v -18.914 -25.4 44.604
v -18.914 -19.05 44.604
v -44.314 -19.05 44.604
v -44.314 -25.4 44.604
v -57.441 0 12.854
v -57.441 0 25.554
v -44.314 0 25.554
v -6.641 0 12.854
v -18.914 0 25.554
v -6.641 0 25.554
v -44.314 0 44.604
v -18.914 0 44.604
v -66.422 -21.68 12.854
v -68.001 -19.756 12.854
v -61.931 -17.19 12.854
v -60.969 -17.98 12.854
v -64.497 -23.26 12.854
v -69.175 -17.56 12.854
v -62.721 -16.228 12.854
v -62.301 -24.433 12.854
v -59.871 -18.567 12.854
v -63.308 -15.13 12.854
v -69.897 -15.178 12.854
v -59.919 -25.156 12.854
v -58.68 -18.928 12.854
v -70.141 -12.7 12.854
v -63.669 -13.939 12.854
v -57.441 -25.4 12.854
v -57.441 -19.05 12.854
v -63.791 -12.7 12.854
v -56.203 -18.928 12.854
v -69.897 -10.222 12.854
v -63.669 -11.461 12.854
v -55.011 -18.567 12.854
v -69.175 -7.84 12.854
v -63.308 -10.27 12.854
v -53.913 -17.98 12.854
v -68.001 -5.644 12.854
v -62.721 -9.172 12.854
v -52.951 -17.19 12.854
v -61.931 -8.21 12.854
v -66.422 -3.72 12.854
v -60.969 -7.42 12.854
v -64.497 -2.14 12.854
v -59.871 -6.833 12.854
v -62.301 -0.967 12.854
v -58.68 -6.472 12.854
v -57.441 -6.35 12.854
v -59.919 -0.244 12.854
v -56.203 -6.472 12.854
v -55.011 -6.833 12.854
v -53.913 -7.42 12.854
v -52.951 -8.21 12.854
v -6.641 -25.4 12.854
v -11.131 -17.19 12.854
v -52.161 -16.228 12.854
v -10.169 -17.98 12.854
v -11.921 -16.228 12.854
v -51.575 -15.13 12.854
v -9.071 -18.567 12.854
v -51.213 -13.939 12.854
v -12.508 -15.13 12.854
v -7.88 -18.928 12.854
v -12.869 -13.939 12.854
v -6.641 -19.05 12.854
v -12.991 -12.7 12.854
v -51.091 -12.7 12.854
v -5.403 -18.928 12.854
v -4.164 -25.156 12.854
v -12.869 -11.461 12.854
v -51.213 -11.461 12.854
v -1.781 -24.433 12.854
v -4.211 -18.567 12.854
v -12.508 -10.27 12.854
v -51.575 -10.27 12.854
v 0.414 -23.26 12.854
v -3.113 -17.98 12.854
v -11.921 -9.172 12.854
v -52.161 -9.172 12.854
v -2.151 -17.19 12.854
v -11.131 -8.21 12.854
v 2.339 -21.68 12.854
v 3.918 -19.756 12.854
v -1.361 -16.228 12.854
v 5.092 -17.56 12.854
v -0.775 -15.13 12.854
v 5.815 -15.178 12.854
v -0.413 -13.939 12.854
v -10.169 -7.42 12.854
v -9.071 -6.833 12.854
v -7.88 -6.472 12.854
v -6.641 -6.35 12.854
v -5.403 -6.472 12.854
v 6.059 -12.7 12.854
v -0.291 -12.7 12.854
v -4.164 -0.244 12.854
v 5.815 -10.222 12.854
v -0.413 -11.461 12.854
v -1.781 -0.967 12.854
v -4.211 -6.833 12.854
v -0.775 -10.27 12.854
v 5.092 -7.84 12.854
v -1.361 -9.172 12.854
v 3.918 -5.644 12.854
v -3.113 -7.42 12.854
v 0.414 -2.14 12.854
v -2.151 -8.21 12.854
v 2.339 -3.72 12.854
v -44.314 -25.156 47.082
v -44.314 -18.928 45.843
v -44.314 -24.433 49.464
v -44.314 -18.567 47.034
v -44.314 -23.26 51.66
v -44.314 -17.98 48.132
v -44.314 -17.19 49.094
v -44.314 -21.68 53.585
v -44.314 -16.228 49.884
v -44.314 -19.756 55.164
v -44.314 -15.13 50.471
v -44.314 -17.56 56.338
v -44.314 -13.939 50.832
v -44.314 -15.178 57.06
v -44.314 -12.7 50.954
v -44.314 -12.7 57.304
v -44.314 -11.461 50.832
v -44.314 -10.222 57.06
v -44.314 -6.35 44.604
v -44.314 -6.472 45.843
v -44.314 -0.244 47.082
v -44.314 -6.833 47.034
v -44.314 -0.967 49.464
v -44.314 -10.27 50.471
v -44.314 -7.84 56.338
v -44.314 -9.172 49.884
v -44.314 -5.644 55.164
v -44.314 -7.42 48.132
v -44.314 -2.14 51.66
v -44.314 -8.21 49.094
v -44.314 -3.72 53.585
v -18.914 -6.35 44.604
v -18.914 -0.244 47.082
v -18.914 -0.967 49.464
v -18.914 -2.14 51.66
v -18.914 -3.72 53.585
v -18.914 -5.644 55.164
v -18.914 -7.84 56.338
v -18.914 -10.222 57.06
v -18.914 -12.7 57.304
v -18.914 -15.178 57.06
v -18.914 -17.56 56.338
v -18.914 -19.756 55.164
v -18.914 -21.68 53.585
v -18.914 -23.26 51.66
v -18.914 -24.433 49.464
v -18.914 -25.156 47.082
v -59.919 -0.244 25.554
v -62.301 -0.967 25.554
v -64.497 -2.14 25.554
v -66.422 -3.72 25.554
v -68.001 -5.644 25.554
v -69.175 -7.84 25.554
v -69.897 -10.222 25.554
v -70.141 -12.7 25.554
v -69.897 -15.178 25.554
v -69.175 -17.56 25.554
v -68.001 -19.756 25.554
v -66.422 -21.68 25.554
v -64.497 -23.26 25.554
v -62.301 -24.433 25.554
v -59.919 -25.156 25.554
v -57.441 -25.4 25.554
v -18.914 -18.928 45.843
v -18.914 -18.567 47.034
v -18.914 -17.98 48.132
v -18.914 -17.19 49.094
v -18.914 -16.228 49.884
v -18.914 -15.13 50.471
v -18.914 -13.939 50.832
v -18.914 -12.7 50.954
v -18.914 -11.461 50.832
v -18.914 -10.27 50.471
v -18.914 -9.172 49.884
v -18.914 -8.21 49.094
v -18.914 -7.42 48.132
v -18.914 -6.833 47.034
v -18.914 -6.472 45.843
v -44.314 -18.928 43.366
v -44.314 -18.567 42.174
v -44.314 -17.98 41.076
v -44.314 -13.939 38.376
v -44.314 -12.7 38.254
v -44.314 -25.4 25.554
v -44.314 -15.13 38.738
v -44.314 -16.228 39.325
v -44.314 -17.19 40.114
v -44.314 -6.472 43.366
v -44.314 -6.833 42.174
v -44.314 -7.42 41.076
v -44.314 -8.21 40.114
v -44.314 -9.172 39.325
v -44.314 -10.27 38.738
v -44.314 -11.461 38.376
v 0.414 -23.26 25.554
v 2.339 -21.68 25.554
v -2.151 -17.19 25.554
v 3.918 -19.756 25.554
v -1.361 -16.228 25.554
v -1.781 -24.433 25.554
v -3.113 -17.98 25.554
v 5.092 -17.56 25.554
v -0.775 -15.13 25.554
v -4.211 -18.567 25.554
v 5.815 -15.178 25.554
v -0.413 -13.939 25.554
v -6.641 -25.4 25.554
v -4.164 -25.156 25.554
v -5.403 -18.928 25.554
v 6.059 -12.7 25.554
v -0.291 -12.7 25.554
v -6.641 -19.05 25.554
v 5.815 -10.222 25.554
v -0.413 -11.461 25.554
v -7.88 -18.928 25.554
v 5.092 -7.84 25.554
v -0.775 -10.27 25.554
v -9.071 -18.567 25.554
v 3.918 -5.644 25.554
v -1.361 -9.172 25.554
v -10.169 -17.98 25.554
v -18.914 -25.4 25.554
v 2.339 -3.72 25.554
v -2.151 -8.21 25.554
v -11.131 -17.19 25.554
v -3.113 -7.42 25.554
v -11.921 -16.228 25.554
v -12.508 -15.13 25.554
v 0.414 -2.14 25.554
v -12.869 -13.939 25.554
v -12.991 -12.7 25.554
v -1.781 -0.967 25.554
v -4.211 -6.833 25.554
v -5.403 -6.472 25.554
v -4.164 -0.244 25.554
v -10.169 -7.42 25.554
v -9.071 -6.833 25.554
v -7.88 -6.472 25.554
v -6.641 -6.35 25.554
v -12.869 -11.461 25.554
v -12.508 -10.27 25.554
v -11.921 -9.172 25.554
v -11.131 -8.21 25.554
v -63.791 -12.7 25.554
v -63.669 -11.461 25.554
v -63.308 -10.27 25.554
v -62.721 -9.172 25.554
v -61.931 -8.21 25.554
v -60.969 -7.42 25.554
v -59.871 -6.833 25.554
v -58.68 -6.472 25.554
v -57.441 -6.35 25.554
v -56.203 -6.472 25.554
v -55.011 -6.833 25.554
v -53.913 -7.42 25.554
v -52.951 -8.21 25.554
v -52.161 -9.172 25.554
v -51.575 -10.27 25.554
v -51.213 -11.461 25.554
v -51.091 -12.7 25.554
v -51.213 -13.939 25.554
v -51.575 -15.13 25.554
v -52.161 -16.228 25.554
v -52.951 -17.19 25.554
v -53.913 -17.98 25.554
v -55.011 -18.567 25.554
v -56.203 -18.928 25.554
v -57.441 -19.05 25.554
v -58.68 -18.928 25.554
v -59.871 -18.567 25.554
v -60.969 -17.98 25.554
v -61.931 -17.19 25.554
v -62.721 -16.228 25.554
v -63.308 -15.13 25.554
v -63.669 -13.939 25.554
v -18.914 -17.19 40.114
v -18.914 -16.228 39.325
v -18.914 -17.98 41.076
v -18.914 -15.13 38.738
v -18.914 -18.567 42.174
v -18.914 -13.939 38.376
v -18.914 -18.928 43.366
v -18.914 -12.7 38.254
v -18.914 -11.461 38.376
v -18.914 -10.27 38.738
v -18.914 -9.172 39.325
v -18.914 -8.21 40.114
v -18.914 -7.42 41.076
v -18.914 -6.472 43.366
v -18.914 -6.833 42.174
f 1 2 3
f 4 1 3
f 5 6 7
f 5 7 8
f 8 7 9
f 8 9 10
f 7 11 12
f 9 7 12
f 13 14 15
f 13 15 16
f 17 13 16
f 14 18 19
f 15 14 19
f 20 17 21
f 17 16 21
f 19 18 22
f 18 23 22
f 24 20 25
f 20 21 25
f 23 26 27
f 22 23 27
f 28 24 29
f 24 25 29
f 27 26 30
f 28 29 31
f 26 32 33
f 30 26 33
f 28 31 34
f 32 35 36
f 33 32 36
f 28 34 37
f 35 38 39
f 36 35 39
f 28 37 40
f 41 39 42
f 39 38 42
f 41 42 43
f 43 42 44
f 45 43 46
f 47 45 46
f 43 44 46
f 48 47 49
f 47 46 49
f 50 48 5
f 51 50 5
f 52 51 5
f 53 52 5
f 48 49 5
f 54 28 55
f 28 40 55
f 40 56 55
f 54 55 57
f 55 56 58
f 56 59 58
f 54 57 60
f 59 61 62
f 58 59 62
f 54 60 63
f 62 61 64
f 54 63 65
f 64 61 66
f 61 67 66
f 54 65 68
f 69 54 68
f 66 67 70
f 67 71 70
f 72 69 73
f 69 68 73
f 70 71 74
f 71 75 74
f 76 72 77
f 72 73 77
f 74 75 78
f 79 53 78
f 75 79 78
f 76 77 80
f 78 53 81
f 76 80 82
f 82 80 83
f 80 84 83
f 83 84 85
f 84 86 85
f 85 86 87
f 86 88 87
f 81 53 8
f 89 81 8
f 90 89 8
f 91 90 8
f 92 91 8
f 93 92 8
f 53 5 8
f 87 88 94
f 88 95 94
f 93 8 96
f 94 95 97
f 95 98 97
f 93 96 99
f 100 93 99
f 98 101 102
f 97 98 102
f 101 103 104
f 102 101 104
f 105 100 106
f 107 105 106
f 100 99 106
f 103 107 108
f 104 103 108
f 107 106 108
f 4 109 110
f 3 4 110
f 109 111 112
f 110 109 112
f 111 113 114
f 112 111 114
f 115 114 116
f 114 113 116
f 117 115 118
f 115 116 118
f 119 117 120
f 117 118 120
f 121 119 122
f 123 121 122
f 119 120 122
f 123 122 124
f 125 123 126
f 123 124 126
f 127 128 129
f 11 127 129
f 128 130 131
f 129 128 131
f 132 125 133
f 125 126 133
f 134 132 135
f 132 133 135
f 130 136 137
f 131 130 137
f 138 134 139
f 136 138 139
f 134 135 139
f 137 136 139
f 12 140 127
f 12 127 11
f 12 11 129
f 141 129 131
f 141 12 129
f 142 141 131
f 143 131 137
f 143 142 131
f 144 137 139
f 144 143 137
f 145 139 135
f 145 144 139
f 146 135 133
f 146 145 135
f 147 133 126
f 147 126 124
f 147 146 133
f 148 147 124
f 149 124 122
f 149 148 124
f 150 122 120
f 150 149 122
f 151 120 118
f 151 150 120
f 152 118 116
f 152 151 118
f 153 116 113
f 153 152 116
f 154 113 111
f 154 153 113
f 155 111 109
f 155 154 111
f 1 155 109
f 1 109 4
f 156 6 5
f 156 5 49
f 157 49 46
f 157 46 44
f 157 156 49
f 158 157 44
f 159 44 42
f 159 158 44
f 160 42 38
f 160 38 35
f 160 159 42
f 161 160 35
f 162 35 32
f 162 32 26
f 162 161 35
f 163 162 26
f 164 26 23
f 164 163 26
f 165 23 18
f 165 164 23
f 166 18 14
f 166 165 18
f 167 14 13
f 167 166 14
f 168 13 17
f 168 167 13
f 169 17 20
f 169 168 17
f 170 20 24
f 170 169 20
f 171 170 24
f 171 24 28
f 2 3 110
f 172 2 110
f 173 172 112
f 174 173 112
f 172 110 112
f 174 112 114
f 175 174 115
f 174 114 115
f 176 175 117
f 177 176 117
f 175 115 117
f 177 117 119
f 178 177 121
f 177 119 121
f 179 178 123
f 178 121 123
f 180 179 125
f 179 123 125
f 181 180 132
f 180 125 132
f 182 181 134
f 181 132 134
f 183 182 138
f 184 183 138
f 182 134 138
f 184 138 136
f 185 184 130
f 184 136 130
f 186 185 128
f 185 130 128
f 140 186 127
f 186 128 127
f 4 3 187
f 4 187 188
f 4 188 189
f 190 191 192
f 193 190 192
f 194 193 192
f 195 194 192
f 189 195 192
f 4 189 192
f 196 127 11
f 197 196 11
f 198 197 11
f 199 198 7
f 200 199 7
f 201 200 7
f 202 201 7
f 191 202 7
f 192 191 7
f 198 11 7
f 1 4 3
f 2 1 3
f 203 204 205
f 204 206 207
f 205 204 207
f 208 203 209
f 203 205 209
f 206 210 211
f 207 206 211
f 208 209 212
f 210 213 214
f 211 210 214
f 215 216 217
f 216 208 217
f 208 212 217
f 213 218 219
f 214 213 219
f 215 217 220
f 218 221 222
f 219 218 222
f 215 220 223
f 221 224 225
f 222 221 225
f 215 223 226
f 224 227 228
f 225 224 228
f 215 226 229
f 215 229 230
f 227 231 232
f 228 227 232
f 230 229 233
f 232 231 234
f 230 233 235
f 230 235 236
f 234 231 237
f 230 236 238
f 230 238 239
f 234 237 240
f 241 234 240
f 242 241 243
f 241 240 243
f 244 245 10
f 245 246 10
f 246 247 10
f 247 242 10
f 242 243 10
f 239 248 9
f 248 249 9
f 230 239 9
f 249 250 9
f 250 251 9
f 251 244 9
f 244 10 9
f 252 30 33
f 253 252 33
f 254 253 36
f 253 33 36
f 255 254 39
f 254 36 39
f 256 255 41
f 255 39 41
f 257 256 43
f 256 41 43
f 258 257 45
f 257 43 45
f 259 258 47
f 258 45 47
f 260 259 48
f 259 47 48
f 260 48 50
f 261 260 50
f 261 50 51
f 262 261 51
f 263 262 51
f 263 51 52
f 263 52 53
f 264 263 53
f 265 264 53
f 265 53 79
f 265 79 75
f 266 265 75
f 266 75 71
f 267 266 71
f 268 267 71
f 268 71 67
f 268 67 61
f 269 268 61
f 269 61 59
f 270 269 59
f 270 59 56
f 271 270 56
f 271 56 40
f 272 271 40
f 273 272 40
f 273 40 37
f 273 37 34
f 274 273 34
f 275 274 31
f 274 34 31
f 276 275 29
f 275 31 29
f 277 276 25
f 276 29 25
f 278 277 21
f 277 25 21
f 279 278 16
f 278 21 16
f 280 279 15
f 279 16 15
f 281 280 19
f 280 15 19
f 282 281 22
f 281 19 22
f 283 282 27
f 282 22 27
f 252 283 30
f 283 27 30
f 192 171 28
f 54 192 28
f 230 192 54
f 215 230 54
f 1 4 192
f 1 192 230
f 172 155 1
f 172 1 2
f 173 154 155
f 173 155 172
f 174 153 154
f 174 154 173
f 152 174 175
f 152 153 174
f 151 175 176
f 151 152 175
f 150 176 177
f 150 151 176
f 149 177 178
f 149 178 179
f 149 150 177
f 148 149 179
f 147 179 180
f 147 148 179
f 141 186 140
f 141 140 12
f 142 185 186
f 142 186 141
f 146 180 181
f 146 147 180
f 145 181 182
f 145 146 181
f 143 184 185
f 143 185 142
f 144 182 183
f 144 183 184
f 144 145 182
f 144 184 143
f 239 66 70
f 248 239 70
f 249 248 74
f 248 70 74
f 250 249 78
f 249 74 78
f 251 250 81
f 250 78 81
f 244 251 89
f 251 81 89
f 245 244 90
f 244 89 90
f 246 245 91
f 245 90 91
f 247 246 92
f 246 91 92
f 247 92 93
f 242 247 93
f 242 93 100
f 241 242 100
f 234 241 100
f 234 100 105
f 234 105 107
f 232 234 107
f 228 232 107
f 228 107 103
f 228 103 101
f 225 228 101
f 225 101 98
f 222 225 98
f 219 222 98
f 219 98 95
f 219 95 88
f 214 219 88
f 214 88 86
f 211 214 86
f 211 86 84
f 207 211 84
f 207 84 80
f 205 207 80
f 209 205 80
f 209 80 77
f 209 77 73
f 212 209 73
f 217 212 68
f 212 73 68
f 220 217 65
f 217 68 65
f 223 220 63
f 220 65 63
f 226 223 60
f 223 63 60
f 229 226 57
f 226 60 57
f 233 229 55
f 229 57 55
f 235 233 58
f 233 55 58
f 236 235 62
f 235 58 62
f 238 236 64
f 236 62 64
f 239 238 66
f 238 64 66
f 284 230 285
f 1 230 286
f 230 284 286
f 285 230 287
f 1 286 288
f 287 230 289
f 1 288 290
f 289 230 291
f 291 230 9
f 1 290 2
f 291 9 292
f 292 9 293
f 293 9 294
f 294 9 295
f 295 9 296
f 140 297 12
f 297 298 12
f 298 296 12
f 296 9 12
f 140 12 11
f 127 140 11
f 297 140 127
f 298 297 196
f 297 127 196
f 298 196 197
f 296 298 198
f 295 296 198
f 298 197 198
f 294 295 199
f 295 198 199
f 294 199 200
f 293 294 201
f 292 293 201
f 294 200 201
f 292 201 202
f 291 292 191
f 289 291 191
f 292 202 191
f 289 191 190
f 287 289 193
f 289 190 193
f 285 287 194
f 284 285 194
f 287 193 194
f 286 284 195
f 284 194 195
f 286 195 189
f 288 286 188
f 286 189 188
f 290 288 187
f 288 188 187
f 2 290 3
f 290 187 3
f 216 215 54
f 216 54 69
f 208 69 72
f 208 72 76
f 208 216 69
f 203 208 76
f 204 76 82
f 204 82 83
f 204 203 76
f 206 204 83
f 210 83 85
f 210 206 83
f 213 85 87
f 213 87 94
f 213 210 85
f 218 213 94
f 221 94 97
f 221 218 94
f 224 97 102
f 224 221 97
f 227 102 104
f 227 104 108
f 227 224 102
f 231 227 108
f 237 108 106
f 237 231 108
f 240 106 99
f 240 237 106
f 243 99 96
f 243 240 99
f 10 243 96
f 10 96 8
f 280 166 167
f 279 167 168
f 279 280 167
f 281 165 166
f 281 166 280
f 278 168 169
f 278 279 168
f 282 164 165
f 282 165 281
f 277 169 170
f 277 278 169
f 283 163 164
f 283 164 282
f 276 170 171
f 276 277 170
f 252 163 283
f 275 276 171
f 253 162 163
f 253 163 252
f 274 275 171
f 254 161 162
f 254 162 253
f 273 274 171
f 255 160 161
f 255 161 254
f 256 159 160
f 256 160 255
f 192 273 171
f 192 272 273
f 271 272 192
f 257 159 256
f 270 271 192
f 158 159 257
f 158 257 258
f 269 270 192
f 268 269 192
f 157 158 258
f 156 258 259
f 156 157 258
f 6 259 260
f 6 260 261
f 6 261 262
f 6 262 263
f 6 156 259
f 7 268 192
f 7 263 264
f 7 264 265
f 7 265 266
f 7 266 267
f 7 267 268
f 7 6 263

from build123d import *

# Parameters (mm, degrees)
F1_DEPTH = 25.4
F4_DEPTH = 12.7
F6_DEPTH = 25.4
F8_D     = 12.7
F10_D    = 12.7
F12_D    = 12.7
F12_2_D  = 12.7


with BuildPart() as f1:
    # F0 (on Front) → F1 (new body)
    with BuildSketch(Plane.XZ):
        Polygon((-18.914438, 44.604348), (-44.314438, 44.604348), (-44.314438, 25.554348), (-57.441327, 25.554348), (-57.441327, 12.854348), (-6.641327, 12.854348), (-6.641327, 25.554348), (-18.914438, 25.554348), align=None)
    extrude(amount=F1_DEPTH)

    # F3 (on face) + F2 (on face) → F4 (join)
    with BuildSketch(Plane.XY.offset(25.554348)):
        with BuildLine():
            Line((-57.441327, -25.4), (-57.441327, 0))
            ThreePointArc((-57.441327, 0), (-70.141327, -12.7), (-57.441327, -25.4))
        make_face()
    with BuildSketch(Plane.XY.offset(25.554348)):
        with BuildLine():
            Line((-6.641327, 0), (-6.641327, -25.4))
            ThreePointArc((-6.641327, -25.4), (6.058673, -12.7), (-6.641327, 0))
        make_face()
    extrude(amount=-F4_DEPTH)

    # F8 (through all)
    with Locations(Plane.XY.offset(25.554348)):
        with Locations((-57.441327, -12.7)):
            Hole(F8_D / 2)

    # F10 (through all)
    with Locations(Plane.XY.offset(25.554348)):
        with Locations((-6.641327, -12.7)):
            Hole(F10_D / 2)

    # F12 (through all)
    with Locations(Plane.YZ.offset(-18.914438)):
        with Locations((-12.7, 44.604348)):
            Hole(F12_D / 2)


with BuildPart() as f6:
    # F5 (on face) → F6 (new body)
    with BuildSketch(Plane.YZ.offset(-18.914438)):
        with BuildLine():
            Line((-25.4, 44.604348), (0, 44.604348))
            ThreePointArc((0, 44.604348), (-12.7, 57.304348), (-25.4, 44.604348))
        make_face()
    extrude(amount=-F6_DEPTH)

    # F12#2 (through all)
    with Locations(Plane.YZ.offset(-18.914438)):
        with Locations((-12.7, 44.604348)):
            Hole(F12_2_D / 2)


solid = Compound([f1.part, f6.part])
